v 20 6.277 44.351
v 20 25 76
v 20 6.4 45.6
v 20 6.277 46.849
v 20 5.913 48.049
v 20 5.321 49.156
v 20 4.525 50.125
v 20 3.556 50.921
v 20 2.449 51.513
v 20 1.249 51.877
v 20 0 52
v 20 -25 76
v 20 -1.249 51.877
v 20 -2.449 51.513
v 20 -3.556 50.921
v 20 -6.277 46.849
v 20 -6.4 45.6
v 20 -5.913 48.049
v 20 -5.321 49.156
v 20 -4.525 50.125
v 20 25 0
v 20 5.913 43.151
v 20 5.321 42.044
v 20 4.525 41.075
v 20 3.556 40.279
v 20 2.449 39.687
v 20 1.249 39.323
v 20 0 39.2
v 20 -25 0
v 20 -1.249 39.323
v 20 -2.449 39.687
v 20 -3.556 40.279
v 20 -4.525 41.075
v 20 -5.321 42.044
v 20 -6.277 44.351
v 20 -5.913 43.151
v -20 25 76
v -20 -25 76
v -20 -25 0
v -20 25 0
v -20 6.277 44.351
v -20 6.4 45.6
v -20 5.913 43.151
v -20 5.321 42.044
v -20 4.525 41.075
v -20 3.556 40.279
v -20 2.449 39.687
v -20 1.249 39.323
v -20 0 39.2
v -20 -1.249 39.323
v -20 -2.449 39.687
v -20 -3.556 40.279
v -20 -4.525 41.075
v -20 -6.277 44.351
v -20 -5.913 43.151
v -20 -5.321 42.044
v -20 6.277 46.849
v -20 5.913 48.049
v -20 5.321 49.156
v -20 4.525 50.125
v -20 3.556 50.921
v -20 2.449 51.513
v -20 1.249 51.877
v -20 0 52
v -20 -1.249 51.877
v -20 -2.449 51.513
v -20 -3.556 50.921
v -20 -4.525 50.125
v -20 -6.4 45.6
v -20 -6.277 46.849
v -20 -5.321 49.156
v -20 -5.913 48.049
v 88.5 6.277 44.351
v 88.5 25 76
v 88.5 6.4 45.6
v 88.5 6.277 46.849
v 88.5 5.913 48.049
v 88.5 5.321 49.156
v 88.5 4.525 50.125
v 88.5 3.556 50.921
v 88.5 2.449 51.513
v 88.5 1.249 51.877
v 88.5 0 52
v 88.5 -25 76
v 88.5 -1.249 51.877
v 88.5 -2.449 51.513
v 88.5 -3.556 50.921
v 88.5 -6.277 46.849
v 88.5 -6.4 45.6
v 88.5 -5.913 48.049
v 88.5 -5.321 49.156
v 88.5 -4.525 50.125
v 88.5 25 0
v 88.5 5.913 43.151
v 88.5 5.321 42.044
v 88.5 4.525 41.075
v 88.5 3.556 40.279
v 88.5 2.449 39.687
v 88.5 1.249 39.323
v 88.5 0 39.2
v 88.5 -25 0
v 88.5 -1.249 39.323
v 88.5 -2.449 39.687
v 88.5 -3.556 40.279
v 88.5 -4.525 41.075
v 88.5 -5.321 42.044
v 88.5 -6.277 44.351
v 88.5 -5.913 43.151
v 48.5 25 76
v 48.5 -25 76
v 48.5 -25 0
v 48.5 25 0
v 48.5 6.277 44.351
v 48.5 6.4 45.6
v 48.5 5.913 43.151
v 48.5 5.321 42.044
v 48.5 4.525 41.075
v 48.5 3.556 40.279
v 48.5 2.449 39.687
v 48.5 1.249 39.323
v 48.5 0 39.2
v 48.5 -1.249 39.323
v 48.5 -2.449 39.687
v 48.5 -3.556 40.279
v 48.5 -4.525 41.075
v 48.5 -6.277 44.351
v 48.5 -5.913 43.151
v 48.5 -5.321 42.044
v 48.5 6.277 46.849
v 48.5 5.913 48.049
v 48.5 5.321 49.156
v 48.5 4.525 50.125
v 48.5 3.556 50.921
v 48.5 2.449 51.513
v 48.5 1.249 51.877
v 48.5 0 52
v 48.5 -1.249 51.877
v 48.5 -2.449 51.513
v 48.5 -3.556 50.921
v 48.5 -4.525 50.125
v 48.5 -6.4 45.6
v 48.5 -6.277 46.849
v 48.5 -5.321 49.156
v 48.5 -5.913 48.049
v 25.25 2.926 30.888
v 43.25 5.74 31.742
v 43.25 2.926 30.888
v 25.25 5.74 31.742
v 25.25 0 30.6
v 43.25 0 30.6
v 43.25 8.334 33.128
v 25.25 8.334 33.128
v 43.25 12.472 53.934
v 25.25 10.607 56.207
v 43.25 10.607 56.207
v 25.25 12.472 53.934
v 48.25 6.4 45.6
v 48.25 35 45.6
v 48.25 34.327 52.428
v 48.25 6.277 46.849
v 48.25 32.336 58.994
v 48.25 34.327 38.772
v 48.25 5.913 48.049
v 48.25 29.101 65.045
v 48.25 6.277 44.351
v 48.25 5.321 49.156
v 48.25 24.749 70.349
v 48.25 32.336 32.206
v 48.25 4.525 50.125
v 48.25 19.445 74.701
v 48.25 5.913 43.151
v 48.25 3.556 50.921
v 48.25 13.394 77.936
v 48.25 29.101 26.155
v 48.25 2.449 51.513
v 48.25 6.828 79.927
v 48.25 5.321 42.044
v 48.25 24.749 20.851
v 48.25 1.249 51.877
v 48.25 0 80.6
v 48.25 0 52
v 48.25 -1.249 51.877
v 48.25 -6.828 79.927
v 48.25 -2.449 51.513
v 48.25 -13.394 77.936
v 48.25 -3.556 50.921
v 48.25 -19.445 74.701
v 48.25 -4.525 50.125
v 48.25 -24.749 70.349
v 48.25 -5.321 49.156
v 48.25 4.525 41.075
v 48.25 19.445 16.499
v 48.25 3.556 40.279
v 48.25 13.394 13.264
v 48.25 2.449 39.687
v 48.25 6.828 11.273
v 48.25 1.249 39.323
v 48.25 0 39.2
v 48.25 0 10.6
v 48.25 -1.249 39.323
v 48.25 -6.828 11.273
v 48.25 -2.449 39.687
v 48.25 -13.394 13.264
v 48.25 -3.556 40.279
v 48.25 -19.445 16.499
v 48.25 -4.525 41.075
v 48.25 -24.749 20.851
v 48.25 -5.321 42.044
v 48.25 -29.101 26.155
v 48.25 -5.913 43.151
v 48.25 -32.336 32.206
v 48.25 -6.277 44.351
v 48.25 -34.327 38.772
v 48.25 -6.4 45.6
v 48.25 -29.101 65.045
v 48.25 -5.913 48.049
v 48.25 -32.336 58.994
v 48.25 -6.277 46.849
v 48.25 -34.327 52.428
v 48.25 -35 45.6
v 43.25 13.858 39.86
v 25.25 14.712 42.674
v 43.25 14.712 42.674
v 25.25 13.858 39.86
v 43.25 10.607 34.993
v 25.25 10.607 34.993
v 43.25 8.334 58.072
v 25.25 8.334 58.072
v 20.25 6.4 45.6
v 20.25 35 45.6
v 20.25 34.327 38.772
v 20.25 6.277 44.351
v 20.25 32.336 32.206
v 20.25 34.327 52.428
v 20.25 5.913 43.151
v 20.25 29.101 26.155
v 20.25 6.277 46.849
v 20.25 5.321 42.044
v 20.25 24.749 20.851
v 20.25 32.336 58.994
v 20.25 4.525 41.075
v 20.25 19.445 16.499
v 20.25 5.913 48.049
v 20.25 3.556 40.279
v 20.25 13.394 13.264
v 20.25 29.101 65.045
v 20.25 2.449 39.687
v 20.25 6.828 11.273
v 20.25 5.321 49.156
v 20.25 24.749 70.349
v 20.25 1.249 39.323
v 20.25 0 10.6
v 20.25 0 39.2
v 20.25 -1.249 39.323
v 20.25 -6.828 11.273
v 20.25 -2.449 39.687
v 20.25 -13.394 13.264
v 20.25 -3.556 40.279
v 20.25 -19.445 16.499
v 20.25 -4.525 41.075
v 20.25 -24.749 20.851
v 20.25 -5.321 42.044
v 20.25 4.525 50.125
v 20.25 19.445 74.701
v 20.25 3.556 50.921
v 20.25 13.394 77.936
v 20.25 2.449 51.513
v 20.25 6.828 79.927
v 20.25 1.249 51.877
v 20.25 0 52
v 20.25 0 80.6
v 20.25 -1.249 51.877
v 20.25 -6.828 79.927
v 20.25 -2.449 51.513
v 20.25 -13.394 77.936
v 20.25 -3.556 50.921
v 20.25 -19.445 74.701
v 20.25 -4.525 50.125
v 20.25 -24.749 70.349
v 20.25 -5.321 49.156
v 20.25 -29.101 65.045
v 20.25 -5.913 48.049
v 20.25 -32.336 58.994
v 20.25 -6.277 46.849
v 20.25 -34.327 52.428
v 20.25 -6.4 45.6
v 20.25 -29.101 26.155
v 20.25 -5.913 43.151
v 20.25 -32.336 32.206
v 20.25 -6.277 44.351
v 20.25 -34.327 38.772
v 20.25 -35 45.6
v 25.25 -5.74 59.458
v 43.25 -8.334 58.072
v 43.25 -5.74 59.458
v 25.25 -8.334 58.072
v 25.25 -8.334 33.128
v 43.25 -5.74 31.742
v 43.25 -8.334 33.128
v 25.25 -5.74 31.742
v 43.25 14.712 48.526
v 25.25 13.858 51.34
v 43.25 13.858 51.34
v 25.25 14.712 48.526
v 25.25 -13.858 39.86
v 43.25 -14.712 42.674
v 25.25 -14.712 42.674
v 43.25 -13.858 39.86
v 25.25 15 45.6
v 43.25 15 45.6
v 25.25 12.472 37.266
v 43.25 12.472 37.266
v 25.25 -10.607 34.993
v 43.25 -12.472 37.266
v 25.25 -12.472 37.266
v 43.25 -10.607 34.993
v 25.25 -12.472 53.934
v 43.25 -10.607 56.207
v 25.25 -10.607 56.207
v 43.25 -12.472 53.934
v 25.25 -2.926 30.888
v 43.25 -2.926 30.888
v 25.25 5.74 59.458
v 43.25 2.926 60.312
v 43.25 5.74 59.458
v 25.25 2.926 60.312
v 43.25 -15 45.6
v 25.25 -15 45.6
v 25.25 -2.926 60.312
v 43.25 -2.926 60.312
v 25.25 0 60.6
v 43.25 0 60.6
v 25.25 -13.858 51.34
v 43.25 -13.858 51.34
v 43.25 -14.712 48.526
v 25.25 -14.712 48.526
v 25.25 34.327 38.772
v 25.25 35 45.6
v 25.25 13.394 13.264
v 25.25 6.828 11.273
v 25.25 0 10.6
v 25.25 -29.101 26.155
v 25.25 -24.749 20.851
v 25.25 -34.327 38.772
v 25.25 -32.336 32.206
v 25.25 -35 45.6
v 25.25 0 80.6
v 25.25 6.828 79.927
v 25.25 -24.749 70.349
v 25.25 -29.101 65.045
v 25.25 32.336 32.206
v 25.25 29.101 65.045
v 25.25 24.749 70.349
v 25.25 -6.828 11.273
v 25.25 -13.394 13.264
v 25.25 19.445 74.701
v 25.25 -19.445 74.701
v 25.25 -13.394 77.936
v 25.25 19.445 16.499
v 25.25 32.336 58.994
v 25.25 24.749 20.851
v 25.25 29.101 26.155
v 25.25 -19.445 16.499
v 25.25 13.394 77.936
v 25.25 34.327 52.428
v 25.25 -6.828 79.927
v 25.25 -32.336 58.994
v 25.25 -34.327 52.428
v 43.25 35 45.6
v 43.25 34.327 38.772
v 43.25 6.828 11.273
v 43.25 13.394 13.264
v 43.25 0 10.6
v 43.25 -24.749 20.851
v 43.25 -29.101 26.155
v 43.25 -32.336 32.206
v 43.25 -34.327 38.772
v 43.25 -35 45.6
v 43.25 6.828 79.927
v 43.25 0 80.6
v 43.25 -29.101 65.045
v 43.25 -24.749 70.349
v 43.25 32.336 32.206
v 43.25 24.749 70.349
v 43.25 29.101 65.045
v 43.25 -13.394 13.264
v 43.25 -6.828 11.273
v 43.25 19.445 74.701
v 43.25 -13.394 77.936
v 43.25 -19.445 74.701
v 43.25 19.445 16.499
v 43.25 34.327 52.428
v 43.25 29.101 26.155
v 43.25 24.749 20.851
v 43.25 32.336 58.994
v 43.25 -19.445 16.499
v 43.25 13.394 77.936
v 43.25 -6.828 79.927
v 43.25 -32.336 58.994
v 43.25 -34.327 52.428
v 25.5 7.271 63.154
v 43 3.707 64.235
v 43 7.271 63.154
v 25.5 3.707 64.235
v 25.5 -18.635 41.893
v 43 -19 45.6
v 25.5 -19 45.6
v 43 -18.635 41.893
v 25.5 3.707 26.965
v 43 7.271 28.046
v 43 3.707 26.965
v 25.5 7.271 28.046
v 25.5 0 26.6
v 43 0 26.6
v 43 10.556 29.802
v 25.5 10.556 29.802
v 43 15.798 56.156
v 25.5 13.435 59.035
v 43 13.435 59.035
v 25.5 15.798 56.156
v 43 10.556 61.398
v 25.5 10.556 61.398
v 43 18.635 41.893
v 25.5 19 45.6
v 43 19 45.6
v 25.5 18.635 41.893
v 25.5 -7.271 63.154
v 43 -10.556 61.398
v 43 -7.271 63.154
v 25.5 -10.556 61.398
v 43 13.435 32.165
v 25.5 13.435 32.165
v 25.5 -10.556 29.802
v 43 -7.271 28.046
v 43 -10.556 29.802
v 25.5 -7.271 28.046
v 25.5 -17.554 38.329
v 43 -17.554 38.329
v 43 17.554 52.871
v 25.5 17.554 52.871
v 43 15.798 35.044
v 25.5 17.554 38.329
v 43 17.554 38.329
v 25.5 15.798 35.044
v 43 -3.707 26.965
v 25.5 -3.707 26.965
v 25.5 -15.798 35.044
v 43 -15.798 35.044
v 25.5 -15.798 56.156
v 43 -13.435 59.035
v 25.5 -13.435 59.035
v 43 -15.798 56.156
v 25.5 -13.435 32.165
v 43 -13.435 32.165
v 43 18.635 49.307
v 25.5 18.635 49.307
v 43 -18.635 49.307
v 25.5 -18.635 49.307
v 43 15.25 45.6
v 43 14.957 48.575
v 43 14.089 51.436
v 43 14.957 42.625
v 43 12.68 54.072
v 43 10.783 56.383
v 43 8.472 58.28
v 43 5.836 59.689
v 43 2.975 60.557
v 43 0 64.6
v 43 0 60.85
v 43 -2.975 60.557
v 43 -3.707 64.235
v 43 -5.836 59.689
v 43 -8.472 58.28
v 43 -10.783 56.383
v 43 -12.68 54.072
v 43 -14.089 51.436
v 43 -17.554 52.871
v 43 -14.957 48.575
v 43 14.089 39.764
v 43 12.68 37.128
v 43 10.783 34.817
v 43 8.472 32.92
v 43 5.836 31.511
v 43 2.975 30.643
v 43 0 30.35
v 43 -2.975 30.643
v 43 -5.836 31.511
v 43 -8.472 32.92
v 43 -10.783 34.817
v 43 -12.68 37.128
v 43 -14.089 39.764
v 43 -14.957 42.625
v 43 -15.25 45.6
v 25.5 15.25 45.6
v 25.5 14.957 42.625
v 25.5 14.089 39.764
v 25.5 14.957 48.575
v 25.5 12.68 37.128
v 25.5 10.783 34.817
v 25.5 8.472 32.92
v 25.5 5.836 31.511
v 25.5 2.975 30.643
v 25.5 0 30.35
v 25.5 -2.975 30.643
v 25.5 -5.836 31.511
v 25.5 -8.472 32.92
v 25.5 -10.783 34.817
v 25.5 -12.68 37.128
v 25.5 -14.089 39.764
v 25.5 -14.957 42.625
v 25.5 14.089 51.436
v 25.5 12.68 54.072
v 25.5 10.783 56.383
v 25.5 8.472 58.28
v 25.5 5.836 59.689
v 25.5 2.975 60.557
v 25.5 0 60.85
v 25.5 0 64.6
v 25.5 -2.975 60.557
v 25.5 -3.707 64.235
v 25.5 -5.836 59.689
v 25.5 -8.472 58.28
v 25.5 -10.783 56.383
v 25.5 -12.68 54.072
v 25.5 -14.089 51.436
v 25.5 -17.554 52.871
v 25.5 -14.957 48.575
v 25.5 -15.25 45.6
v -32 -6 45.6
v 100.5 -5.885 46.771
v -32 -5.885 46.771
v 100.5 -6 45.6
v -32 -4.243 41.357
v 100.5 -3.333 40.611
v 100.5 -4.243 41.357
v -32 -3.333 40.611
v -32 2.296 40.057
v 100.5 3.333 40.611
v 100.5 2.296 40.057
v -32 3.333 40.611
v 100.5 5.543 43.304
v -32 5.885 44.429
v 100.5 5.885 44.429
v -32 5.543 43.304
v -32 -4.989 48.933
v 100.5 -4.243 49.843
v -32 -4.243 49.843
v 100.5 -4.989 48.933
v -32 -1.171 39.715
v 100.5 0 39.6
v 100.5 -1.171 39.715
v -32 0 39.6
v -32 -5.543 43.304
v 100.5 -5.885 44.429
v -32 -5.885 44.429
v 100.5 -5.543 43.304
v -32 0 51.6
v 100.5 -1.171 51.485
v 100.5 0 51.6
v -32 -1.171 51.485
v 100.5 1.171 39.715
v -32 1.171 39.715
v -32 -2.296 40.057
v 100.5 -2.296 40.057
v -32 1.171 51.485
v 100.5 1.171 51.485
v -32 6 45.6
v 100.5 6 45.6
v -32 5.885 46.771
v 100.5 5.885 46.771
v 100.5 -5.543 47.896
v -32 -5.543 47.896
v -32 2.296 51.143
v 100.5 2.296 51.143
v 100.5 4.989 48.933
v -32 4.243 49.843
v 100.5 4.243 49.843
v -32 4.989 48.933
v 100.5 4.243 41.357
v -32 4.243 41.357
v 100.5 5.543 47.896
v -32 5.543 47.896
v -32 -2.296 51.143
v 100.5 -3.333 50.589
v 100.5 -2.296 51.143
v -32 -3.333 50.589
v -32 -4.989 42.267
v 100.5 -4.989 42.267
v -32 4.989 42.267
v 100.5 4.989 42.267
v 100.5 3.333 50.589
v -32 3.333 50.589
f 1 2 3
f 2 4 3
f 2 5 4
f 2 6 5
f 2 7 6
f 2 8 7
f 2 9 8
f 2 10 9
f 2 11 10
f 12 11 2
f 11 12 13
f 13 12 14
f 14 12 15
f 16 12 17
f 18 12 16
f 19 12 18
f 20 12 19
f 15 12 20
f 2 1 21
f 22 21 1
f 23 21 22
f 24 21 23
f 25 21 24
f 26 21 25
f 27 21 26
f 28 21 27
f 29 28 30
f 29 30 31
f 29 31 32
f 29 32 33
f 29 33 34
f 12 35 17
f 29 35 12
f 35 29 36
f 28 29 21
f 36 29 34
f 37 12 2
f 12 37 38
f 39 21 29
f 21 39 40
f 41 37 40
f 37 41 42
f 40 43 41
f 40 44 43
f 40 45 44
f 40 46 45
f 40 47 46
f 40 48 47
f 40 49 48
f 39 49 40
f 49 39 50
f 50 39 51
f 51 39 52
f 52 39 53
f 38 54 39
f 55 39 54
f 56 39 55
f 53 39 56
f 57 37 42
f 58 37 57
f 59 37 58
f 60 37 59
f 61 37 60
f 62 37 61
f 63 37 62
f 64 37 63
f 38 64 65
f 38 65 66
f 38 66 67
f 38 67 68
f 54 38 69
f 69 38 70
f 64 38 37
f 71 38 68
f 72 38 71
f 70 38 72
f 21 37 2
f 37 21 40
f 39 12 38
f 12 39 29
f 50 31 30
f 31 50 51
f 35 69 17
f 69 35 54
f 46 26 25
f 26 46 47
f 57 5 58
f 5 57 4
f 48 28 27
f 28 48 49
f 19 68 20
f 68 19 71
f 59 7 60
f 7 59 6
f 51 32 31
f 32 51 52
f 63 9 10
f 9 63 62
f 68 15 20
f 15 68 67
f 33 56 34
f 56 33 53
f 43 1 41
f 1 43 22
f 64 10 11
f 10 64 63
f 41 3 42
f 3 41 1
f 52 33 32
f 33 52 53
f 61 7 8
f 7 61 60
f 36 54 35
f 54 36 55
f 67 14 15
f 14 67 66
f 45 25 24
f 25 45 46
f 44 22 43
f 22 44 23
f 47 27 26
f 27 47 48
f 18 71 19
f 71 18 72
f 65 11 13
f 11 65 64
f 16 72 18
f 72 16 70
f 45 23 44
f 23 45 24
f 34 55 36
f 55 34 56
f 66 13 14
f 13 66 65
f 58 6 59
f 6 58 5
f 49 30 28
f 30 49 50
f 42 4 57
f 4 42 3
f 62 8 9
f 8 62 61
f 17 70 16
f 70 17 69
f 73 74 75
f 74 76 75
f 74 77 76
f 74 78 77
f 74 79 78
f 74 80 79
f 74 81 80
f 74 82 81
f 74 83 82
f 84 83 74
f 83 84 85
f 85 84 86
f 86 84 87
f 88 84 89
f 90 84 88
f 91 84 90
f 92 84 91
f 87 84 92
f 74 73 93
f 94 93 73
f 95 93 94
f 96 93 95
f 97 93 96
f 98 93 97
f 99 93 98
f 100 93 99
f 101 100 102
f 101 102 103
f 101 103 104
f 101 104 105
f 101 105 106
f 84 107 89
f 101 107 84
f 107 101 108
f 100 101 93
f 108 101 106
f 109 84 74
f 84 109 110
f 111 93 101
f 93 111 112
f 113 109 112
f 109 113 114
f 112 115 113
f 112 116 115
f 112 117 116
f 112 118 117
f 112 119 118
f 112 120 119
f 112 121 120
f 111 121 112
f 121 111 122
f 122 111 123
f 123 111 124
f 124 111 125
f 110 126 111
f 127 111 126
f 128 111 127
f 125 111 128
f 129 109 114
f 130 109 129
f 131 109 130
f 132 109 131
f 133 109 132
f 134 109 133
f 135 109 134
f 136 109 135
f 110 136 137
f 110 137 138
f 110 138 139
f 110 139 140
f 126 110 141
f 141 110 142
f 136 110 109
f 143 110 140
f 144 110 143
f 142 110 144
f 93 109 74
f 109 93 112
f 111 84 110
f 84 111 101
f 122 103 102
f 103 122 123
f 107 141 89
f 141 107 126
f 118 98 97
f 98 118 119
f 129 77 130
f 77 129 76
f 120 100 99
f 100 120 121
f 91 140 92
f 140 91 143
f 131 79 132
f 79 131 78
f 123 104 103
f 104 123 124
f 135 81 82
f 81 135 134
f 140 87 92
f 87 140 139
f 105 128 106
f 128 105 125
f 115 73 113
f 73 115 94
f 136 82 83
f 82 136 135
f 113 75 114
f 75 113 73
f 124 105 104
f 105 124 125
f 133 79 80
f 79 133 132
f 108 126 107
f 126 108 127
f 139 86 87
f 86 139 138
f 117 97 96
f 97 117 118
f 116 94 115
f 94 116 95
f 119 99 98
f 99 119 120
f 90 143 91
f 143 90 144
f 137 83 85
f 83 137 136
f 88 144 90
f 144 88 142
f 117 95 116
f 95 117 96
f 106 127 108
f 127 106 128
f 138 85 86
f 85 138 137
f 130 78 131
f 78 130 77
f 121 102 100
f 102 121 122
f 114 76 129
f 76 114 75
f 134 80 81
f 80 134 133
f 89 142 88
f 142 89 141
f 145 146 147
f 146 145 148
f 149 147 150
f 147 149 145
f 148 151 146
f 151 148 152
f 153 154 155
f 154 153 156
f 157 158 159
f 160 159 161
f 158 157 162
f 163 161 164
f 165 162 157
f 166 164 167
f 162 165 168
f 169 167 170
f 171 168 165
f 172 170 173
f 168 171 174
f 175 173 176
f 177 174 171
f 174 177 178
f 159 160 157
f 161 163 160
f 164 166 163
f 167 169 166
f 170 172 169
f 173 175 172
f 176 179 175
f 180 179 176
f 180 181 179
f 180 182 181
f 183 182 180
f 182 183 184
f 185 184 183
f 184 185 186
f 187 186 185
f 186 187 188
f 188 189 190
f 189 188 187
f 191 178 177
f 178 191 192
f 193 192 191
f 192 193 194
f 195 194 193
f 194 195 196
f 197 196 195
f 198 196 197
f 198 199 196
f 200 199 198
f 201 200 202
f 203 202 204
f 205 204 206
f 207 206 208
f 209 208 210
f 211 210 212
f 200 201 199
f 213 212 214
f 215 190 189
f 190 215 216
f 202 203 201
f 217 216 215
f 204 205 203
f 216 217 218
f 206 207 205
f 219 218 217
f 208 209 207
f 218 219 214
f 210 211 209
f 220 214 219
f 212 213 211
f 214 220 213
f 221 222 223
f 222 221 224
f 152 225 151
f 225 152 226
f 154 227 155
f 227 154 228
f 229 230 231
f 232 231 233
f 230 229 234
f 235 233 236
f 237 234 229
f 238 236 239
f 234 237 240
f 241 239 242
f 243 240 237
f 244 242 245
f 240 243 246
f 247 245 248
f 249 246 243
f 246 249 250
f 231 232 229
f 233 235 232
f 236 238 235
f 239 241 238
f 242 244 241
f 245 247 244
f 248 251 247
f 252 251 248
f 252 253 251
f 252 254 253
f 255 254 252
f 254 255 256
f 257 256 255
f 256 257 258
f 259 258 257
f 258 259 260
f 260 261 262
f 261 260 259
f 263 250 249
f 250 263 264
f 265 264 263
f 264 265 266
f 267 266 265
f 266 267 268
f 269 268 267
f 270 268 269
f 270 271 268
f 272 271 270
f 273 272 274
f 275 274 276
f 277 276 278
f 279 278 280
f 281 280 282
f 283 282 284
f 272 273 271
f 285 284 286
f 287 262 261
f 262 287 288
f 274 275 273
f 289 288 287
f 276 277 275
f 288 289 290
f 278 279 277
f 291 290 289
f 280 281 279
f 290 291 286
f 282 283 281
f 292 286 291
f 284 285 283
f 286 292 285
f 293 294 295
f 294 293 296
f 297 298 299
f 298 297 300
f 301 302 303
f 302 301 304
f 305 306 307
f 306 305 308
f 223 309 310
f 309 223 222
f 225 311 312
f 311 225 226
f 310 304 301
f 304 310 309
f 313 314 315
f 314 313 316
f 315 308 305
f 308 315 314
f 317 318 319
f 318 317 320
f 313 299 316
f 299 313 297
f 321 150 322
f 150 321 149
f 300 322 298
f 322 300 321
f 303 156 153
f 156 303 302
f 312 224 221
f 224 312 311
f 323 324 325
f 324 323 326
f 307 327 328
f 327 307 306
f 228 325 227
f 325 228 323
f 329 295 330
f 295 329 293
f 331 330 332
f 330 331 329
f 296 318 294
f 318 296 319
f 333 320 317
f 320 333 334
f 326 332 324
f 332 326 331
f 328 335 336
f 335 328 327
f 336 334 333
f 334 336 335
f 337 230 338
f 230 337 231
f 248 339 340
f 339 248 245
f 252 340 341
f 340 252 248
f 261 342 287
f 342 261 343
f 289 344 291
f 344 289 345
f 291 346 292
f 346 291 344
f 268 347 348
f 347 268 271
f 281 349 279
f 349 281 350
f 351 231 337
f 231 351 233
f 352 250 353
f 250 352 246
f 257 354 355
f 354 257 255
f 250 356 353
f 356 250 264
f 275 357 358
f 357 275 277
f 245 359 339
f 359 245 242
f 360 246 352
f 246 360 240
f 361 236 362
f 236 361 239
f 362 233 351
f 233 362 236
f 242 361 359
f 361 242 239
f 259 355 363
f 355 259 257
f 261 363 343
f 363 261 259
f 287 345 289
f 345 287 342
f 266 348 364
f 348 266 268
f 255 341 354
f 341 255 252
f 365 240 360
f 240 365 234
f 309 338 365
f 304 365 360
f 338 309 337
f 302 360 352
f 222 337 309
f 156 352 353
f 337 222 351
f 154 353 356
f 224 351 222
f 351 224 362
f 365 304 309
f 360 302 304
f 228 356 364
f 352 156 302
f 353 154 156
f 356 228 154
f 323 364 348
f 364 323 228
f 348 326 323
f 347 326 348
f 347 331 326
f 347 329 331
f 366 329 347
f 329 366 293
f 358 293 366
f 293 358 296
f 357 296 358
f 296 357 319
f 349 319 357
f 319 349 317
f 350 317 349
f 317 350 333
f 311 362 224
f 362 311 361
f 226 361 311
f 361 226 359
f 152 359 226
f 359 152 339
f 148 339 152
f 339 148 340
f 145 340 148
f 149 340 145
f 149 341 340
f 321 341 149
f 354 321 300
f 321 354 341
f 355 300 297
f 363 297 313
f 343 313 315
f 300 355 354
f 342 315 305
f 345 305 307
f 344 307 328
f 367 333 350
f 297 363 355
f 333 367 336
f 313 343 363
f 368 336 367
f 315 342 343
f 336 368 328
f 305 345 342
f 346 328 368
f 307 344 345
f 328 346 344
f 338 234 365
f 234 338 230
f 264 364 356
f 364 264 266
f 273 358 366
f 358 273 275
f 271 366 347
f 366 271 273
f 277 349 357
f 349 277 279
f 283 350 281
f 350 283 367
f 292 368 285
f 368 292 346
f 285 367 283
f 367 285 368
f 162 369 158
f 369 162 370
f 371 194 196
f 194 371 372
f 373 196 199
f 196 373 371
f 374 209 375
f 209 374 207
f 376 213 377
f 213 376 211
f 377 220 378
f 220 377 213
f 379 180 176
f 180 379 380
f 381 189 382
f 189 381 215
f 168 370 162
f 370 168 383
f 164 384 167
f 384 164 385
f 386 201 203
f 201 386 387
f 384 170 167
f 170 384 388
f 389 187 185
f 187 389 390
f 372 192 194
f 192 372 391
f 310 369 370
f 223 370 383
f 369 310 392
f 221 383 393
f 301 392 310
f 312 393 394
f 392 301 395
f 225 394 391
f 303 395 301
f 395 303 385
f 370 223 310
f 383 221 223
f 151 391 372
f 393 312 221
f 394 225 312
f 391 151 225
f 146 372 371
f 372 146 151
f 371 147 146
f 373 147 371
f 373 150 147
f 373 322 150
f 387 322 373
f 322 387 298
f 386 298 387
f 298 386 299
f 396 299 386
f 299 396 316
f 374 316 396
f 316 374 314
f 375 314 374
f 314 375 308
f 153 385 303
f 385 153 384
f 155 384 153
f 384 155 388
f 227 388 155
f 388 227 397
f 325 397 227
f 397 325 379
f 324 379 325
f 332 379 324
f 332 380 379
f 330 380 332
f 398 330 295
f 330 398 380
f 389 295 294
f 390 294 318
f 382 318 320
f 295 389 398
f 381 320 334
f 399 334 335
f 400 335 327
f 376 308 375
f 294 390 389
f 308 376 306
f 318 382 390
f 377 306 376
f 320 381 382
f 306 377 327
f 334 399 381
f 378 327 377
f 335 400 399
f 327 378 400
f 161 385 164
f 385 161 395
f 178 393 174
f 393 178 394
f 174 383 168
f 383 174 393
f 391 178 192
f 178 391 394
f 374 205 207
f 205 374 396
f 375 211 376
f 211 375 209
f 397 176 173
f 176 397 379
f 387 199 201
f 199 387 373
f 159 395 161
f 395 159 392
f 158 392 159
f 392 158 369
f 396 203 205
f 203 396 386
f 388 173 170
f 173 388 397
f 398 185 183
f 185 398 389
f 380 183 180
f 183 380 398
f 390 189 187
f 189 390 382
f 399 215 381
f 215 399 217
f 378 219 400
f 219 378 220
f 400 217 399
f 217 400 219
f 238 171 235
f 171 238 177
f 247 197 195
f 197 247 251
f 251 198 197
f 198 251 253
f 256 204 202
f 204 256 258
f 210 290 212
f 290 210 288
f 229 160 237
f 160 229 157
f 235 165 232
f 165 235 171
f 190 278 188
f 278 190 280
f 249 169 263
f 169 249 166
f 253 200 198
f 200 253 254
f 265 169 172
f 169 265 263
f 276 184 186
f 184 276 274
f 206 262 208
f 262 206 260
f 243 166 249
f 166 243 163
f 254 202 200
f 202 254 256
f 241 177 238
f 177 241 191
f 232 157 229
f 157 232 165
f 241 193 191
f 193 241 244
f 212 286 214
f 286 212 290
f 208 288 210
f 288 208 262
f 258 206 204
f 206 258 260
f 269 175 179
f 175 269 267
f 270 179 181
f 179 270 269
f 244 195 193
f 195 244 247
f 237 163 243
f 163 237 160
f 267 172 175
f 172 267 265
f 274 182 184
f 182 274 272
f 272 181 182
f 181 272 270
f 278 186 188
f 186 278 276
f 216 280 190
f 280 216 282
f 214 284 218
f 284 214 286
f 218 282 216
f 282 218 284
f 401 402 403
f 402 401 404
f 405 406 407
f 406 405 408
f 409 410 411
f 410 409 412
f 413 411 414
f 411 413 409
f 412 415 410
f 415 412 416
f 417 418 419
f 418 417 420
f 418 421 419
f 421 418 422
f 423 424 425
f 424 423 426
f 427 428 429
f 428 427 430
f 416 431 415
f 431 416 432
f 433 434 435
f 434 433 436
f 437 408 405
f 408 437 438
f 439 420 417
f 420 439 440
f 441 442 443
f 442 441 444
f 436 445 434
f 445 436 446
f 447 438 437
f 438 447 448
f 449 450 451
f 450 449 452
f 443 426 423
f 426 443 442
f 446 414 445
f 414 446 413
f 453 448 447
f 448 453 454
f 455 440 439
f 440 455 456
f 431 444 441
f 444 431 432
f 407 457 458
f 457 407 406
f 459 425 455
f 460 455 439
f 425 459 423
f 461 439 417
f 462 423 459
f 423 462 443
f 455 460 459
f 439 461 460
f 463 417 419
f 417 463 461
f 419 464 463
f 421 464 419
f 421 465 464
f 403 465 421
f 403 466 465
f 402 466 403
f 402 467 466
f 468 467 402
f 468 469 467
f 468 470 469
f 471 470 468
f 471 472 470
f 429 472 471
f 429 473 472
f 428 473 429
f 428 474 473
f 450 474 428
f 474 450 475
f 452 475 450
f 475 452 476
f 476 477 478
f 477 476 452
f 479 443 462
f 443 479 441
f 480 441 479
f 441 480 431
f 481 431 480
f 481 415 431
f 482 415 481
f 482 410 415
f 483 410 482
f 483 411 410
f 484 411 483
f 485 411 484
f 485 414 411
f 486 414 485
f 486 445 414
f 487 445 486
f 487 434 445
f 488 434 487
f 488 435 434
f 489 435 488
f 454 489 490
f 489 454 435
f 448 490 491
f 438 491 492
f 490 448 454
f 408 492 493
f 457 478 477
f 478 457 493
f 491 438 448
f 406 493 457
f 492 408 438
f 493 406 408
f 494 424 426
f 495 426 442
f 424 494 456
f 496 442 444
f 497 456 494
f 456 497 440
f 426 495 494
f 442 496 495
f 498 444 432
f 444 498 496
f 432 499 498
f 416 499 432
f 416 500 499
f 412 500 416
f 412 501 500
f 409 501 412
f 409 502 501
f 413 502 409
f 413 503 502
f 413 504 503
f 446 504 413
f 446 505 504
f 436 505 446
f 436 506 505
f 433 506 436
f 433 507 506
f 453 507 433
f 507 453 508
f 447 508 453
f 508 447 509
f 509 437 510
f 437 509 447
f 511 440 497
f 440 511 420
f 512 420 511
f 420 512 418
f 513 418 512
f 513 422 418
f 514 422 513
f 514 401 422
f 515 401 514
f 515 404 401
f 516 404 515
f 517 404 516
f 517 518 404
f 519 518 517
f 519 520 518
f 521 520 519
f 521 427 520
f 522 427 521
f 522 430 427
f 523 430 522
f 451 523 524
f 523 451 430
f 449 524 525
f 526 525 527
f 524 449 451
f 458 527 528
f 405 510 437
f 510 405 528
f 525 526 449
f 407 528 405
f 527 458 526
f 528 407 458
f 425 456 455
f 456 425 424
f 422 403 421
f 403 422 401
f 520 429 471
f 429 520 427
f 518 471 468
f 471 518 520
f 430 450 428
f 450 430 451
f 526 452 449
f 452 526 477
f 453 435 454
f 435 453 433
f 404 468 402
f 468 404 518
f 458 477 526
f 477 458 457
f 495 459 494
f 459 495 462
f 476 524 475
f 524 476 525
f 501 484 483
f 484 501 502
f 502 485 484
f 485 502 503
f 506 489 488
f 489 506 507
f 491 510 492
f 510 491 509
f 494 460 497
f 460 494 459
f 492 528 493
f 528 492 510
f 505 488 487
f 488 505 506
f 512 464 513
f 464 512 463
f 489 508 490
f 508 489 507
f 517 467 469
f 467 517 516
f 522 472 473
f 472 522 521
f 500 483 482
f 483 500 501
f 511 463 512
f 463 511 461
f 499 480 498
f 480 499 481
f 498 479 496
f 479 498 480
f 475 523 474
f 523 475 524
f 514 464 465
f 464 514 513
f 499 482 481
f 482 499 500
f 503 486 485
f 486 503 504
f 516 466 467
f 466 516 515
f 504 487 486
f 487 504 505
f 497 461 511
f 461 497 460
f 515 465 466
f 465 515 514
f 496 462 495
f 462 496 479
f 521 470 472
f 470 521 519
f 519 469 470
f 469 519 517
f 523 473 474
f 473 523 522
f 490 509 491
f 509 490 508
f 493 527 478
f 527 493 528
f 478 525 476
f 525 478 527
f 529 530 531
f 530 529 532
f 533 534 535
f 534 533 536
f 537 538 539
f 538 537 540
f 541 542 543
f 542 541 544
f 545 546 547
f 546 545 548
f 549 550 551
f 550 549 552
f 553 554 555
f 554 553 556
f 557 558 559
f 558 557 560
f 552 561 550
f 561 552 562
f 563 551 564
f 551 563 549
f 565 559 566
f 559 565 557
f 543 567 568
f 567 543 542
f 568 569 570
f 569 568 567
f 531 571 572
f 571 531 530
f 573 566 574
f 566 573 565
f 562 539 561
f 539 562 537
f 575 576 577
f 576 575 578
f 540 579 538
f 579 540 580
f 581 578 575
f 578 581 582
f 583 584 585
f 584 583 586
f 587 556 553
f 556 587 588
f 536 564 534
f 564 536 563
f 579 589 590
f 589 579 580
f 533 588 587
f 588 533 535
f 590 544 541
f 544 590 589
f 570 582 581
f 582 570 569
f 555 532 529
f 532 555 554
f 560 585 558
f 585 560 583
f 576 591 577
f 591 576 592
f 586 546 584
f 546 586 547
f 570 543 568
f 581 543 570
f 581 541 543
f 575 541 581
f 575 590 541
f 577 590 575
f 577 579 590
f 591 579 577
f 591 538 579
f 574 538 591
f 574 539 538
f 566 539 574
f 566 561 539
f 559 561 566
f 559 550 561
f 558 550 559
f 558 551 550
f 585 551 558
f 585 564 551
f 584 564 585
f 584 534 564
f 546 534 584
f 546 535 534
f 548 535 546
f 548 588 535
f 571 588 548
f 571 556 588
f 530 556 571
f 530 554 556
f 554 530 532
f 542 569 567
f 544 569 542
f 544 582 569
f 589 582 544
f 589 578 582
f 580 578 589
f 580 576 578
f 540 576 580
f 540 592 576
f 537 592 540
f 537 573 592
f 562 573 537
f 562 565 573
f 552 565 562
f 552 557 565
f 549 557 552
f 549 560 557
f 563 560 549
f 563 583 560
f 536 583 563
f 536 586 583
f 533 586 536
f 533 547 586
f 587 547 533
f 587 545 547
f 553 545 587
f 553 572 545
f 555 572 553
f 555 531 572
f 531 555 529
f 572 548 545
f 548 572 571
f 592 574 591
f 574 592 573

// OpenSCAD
$fn = 32;

// ------------------------------------------------------------------------
// Pulley assembly: d70 pulley with a belt, shaft d12
// Every part is its own module, assembly() places them once.
// ------------------------------------------------------------------------

// --- part 1 ---
module support1() {
  difference() {
    translate([-20, -25, 0]) cube([40, 50, 76]);
    translate([0, 0, 45.6]) rotate([0, 90, 0]) cylinder(h = 42, d = 12.8, center = true);
  }
}

// --- part 2 ---
module support2() {
  difference() {
    translate([-20, -25, 0]) cube([40, 50, 76]);
    translate([0, 0, 45.6]) rotate([0, 90, 0]) cylinder(h = 42, d = 12.8, center = true);
  }
}

// --- part 3 ---
module shaft() {
  translate([0, 0, -66.25]) cylinder(h = 132.5, d = 12);
}

// --- part 4 ---
module pulley() {
  difference() {
    union() {
      cylinder(h = 28, d = 30);
      cylinder(h = 5, d = 70);
      translate([0, 0, 23]) cylinder(h = 5, d = 70);
    }
    translate([0, 0, -1]) cylinder(h = 30, d = 12.8);
  }
}

// --- part 5 ---
module belt() {
  difference() {
      translate([0, 0, 0]) cylinder(h = 17.5, d = 38);
      translate([0, 0, -1]) cylinder(h = 19.5, d = 30.5);
    }
}

// --- assembly ---
module assembly() {
  translate([0, 0, 0]) rotate([0, 0, 0]) support1();
  translate([68.5, 0, 0]) rotate([0, 0, 0]) support2();
  translate([34.25, 0, 45.6]) rotate([0, 90, 0]) shaft();
  translate([20.25, 0, 45.6]) rotate([0, 90, 0]) pulley();
  translate([25.5, 0, 45.6]) rotate([0, 90, 0]) belt();
}

assembly();
